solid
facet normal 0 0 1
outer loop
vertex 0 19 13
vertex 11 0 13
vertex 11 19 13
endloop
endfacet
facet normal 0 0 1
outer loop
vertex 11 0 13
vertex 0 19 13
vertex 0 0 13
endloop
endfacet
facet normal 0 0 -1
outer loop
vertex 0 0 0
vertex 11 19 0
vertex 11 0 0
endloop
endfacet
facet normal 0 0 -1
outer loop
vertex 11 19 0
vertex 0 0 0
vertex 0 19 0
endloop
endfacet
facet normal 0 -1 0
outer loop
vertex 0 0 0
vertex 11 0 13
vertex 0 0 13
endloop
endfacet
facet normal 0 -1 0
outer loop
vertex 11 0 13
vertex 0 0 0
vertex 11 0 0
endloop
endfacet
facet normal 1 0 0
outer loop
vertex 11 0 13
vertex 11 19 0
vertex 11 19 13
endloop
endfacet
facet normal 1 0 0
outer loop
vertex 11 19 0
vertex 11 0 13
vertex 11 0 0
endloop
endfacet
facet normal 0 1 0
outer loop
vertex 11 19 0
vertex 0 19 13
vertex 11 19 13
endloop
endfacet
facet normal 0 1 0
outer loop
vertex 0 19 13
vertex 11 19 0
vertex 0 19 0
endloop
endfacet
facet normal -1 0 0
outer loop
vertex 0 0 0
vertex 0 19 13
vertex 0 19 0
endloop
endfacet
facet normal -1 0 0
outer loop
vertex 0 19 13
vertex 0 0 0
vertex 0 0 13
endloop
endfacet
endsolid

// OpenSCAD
// Generated by SolidPython 1.0.1 on 2020-07-29 00:46:55


cube(size = [11, 19, 13]);
/***********************************************
*********      SolidPython code:      **********
************************************************
 
# import packages: SolidPython
from solid import *
from solid.utils import *
from itertools import chain, combinations, permutations


class Resize:

    def __init__(self, scad_file):
        self.scad_file = scad_file
        #self.scad_file = import_scad(scad_file)
        # cone/cylinder param:
        self.r1 = 0
        self.r2 = 0
        self.h = 0
        # rectangular prism param:
        self.w = 0
        self.l = 0
        # ellipse param:
        self.r = 0

    # import OpenScad code (file name corresponds to shape)


    # classify shape + parameters
    def assign(self, param1, param2, param3):
        if self.scad_file == 'cone.scad':
            self.r1 = param1
            self.r2 = param2
            self.h = param3
        elif self.scad_file == 'cylinder.scad':
            self.r1 = param1
            self.r2 = param2
            self.h = param3
        elif self.scad_file == 'rectangularPrism.scad':
            self.h = param1
            self.l = param2
            self.w = param3
        else:
            self.r = param1
            self.h = param2

    # resize parameters
    def iterate(self):
        x = range(3, 20, 2)
        i = 1
        if self.scad_file == 'cone.scad':
            tempList = list(permutations(x, 2))
            for temp in tempList:
                param1 = temp[0]
                param2 = temp[1]
                filepath = 'produced_scad_files/' + 'cone' + str(param1) + '_' + str(param2) + '_' + '.scad'
                scad_render_to_file(cylinder(h=param1, r1=param2, r2=0), filepath)

        elif self.scad_file == 'cylinder.scad':
            tempList = list(permutations(x, 3))
            for temp in tempList:
                param1 = temp[0]
                param2 = temp[1]
                filepath = 'produced_scad_files/' + 'cylinder' + str(param1) + '_' + str(param2) + '_' + '.scad'
                scad_render_to_file(cylinder(h=param1, r1=param2, r2=param2), filepath)

        elif self.scad_file == 'rectangularPrism.scad':
            tempList = list(permutations(x, 3))
            for temp in tempList:
                param1 = temp[0]
                param2 = temp[1]
                param3 = temp[2]
                filepath = 'produced_scad_files/' + 'rectangularPrism' + str(param1) + '_' + str(param2) + '_' + str(
                    param3) + '.scad'
                scad_render_to_file(cube(size=(param1, param2, param3)), filepath)

        elif self.scad_file == 'ellipse.scad':
            tempList = list(permutations(x, 4))
            for temp in tempList:
                param1 = temp[0]
                param2 = temp[1]
                param3 = temp[2]
                param4 = temp[3]
                filepath = 'produced_scad_files/' + 'ellipse' + str(param1) + '_' + str(param2) + '_' + str(param3) + '_' + str(param4) + '.scad'
                scad_render_to_file(scale([param1, param2, param3])(sphere(r=param4)), filepath)

    def render_to_scadfile(self):
        scad_render_to_file(scad, 'example.scad') 
 
************************************************/
